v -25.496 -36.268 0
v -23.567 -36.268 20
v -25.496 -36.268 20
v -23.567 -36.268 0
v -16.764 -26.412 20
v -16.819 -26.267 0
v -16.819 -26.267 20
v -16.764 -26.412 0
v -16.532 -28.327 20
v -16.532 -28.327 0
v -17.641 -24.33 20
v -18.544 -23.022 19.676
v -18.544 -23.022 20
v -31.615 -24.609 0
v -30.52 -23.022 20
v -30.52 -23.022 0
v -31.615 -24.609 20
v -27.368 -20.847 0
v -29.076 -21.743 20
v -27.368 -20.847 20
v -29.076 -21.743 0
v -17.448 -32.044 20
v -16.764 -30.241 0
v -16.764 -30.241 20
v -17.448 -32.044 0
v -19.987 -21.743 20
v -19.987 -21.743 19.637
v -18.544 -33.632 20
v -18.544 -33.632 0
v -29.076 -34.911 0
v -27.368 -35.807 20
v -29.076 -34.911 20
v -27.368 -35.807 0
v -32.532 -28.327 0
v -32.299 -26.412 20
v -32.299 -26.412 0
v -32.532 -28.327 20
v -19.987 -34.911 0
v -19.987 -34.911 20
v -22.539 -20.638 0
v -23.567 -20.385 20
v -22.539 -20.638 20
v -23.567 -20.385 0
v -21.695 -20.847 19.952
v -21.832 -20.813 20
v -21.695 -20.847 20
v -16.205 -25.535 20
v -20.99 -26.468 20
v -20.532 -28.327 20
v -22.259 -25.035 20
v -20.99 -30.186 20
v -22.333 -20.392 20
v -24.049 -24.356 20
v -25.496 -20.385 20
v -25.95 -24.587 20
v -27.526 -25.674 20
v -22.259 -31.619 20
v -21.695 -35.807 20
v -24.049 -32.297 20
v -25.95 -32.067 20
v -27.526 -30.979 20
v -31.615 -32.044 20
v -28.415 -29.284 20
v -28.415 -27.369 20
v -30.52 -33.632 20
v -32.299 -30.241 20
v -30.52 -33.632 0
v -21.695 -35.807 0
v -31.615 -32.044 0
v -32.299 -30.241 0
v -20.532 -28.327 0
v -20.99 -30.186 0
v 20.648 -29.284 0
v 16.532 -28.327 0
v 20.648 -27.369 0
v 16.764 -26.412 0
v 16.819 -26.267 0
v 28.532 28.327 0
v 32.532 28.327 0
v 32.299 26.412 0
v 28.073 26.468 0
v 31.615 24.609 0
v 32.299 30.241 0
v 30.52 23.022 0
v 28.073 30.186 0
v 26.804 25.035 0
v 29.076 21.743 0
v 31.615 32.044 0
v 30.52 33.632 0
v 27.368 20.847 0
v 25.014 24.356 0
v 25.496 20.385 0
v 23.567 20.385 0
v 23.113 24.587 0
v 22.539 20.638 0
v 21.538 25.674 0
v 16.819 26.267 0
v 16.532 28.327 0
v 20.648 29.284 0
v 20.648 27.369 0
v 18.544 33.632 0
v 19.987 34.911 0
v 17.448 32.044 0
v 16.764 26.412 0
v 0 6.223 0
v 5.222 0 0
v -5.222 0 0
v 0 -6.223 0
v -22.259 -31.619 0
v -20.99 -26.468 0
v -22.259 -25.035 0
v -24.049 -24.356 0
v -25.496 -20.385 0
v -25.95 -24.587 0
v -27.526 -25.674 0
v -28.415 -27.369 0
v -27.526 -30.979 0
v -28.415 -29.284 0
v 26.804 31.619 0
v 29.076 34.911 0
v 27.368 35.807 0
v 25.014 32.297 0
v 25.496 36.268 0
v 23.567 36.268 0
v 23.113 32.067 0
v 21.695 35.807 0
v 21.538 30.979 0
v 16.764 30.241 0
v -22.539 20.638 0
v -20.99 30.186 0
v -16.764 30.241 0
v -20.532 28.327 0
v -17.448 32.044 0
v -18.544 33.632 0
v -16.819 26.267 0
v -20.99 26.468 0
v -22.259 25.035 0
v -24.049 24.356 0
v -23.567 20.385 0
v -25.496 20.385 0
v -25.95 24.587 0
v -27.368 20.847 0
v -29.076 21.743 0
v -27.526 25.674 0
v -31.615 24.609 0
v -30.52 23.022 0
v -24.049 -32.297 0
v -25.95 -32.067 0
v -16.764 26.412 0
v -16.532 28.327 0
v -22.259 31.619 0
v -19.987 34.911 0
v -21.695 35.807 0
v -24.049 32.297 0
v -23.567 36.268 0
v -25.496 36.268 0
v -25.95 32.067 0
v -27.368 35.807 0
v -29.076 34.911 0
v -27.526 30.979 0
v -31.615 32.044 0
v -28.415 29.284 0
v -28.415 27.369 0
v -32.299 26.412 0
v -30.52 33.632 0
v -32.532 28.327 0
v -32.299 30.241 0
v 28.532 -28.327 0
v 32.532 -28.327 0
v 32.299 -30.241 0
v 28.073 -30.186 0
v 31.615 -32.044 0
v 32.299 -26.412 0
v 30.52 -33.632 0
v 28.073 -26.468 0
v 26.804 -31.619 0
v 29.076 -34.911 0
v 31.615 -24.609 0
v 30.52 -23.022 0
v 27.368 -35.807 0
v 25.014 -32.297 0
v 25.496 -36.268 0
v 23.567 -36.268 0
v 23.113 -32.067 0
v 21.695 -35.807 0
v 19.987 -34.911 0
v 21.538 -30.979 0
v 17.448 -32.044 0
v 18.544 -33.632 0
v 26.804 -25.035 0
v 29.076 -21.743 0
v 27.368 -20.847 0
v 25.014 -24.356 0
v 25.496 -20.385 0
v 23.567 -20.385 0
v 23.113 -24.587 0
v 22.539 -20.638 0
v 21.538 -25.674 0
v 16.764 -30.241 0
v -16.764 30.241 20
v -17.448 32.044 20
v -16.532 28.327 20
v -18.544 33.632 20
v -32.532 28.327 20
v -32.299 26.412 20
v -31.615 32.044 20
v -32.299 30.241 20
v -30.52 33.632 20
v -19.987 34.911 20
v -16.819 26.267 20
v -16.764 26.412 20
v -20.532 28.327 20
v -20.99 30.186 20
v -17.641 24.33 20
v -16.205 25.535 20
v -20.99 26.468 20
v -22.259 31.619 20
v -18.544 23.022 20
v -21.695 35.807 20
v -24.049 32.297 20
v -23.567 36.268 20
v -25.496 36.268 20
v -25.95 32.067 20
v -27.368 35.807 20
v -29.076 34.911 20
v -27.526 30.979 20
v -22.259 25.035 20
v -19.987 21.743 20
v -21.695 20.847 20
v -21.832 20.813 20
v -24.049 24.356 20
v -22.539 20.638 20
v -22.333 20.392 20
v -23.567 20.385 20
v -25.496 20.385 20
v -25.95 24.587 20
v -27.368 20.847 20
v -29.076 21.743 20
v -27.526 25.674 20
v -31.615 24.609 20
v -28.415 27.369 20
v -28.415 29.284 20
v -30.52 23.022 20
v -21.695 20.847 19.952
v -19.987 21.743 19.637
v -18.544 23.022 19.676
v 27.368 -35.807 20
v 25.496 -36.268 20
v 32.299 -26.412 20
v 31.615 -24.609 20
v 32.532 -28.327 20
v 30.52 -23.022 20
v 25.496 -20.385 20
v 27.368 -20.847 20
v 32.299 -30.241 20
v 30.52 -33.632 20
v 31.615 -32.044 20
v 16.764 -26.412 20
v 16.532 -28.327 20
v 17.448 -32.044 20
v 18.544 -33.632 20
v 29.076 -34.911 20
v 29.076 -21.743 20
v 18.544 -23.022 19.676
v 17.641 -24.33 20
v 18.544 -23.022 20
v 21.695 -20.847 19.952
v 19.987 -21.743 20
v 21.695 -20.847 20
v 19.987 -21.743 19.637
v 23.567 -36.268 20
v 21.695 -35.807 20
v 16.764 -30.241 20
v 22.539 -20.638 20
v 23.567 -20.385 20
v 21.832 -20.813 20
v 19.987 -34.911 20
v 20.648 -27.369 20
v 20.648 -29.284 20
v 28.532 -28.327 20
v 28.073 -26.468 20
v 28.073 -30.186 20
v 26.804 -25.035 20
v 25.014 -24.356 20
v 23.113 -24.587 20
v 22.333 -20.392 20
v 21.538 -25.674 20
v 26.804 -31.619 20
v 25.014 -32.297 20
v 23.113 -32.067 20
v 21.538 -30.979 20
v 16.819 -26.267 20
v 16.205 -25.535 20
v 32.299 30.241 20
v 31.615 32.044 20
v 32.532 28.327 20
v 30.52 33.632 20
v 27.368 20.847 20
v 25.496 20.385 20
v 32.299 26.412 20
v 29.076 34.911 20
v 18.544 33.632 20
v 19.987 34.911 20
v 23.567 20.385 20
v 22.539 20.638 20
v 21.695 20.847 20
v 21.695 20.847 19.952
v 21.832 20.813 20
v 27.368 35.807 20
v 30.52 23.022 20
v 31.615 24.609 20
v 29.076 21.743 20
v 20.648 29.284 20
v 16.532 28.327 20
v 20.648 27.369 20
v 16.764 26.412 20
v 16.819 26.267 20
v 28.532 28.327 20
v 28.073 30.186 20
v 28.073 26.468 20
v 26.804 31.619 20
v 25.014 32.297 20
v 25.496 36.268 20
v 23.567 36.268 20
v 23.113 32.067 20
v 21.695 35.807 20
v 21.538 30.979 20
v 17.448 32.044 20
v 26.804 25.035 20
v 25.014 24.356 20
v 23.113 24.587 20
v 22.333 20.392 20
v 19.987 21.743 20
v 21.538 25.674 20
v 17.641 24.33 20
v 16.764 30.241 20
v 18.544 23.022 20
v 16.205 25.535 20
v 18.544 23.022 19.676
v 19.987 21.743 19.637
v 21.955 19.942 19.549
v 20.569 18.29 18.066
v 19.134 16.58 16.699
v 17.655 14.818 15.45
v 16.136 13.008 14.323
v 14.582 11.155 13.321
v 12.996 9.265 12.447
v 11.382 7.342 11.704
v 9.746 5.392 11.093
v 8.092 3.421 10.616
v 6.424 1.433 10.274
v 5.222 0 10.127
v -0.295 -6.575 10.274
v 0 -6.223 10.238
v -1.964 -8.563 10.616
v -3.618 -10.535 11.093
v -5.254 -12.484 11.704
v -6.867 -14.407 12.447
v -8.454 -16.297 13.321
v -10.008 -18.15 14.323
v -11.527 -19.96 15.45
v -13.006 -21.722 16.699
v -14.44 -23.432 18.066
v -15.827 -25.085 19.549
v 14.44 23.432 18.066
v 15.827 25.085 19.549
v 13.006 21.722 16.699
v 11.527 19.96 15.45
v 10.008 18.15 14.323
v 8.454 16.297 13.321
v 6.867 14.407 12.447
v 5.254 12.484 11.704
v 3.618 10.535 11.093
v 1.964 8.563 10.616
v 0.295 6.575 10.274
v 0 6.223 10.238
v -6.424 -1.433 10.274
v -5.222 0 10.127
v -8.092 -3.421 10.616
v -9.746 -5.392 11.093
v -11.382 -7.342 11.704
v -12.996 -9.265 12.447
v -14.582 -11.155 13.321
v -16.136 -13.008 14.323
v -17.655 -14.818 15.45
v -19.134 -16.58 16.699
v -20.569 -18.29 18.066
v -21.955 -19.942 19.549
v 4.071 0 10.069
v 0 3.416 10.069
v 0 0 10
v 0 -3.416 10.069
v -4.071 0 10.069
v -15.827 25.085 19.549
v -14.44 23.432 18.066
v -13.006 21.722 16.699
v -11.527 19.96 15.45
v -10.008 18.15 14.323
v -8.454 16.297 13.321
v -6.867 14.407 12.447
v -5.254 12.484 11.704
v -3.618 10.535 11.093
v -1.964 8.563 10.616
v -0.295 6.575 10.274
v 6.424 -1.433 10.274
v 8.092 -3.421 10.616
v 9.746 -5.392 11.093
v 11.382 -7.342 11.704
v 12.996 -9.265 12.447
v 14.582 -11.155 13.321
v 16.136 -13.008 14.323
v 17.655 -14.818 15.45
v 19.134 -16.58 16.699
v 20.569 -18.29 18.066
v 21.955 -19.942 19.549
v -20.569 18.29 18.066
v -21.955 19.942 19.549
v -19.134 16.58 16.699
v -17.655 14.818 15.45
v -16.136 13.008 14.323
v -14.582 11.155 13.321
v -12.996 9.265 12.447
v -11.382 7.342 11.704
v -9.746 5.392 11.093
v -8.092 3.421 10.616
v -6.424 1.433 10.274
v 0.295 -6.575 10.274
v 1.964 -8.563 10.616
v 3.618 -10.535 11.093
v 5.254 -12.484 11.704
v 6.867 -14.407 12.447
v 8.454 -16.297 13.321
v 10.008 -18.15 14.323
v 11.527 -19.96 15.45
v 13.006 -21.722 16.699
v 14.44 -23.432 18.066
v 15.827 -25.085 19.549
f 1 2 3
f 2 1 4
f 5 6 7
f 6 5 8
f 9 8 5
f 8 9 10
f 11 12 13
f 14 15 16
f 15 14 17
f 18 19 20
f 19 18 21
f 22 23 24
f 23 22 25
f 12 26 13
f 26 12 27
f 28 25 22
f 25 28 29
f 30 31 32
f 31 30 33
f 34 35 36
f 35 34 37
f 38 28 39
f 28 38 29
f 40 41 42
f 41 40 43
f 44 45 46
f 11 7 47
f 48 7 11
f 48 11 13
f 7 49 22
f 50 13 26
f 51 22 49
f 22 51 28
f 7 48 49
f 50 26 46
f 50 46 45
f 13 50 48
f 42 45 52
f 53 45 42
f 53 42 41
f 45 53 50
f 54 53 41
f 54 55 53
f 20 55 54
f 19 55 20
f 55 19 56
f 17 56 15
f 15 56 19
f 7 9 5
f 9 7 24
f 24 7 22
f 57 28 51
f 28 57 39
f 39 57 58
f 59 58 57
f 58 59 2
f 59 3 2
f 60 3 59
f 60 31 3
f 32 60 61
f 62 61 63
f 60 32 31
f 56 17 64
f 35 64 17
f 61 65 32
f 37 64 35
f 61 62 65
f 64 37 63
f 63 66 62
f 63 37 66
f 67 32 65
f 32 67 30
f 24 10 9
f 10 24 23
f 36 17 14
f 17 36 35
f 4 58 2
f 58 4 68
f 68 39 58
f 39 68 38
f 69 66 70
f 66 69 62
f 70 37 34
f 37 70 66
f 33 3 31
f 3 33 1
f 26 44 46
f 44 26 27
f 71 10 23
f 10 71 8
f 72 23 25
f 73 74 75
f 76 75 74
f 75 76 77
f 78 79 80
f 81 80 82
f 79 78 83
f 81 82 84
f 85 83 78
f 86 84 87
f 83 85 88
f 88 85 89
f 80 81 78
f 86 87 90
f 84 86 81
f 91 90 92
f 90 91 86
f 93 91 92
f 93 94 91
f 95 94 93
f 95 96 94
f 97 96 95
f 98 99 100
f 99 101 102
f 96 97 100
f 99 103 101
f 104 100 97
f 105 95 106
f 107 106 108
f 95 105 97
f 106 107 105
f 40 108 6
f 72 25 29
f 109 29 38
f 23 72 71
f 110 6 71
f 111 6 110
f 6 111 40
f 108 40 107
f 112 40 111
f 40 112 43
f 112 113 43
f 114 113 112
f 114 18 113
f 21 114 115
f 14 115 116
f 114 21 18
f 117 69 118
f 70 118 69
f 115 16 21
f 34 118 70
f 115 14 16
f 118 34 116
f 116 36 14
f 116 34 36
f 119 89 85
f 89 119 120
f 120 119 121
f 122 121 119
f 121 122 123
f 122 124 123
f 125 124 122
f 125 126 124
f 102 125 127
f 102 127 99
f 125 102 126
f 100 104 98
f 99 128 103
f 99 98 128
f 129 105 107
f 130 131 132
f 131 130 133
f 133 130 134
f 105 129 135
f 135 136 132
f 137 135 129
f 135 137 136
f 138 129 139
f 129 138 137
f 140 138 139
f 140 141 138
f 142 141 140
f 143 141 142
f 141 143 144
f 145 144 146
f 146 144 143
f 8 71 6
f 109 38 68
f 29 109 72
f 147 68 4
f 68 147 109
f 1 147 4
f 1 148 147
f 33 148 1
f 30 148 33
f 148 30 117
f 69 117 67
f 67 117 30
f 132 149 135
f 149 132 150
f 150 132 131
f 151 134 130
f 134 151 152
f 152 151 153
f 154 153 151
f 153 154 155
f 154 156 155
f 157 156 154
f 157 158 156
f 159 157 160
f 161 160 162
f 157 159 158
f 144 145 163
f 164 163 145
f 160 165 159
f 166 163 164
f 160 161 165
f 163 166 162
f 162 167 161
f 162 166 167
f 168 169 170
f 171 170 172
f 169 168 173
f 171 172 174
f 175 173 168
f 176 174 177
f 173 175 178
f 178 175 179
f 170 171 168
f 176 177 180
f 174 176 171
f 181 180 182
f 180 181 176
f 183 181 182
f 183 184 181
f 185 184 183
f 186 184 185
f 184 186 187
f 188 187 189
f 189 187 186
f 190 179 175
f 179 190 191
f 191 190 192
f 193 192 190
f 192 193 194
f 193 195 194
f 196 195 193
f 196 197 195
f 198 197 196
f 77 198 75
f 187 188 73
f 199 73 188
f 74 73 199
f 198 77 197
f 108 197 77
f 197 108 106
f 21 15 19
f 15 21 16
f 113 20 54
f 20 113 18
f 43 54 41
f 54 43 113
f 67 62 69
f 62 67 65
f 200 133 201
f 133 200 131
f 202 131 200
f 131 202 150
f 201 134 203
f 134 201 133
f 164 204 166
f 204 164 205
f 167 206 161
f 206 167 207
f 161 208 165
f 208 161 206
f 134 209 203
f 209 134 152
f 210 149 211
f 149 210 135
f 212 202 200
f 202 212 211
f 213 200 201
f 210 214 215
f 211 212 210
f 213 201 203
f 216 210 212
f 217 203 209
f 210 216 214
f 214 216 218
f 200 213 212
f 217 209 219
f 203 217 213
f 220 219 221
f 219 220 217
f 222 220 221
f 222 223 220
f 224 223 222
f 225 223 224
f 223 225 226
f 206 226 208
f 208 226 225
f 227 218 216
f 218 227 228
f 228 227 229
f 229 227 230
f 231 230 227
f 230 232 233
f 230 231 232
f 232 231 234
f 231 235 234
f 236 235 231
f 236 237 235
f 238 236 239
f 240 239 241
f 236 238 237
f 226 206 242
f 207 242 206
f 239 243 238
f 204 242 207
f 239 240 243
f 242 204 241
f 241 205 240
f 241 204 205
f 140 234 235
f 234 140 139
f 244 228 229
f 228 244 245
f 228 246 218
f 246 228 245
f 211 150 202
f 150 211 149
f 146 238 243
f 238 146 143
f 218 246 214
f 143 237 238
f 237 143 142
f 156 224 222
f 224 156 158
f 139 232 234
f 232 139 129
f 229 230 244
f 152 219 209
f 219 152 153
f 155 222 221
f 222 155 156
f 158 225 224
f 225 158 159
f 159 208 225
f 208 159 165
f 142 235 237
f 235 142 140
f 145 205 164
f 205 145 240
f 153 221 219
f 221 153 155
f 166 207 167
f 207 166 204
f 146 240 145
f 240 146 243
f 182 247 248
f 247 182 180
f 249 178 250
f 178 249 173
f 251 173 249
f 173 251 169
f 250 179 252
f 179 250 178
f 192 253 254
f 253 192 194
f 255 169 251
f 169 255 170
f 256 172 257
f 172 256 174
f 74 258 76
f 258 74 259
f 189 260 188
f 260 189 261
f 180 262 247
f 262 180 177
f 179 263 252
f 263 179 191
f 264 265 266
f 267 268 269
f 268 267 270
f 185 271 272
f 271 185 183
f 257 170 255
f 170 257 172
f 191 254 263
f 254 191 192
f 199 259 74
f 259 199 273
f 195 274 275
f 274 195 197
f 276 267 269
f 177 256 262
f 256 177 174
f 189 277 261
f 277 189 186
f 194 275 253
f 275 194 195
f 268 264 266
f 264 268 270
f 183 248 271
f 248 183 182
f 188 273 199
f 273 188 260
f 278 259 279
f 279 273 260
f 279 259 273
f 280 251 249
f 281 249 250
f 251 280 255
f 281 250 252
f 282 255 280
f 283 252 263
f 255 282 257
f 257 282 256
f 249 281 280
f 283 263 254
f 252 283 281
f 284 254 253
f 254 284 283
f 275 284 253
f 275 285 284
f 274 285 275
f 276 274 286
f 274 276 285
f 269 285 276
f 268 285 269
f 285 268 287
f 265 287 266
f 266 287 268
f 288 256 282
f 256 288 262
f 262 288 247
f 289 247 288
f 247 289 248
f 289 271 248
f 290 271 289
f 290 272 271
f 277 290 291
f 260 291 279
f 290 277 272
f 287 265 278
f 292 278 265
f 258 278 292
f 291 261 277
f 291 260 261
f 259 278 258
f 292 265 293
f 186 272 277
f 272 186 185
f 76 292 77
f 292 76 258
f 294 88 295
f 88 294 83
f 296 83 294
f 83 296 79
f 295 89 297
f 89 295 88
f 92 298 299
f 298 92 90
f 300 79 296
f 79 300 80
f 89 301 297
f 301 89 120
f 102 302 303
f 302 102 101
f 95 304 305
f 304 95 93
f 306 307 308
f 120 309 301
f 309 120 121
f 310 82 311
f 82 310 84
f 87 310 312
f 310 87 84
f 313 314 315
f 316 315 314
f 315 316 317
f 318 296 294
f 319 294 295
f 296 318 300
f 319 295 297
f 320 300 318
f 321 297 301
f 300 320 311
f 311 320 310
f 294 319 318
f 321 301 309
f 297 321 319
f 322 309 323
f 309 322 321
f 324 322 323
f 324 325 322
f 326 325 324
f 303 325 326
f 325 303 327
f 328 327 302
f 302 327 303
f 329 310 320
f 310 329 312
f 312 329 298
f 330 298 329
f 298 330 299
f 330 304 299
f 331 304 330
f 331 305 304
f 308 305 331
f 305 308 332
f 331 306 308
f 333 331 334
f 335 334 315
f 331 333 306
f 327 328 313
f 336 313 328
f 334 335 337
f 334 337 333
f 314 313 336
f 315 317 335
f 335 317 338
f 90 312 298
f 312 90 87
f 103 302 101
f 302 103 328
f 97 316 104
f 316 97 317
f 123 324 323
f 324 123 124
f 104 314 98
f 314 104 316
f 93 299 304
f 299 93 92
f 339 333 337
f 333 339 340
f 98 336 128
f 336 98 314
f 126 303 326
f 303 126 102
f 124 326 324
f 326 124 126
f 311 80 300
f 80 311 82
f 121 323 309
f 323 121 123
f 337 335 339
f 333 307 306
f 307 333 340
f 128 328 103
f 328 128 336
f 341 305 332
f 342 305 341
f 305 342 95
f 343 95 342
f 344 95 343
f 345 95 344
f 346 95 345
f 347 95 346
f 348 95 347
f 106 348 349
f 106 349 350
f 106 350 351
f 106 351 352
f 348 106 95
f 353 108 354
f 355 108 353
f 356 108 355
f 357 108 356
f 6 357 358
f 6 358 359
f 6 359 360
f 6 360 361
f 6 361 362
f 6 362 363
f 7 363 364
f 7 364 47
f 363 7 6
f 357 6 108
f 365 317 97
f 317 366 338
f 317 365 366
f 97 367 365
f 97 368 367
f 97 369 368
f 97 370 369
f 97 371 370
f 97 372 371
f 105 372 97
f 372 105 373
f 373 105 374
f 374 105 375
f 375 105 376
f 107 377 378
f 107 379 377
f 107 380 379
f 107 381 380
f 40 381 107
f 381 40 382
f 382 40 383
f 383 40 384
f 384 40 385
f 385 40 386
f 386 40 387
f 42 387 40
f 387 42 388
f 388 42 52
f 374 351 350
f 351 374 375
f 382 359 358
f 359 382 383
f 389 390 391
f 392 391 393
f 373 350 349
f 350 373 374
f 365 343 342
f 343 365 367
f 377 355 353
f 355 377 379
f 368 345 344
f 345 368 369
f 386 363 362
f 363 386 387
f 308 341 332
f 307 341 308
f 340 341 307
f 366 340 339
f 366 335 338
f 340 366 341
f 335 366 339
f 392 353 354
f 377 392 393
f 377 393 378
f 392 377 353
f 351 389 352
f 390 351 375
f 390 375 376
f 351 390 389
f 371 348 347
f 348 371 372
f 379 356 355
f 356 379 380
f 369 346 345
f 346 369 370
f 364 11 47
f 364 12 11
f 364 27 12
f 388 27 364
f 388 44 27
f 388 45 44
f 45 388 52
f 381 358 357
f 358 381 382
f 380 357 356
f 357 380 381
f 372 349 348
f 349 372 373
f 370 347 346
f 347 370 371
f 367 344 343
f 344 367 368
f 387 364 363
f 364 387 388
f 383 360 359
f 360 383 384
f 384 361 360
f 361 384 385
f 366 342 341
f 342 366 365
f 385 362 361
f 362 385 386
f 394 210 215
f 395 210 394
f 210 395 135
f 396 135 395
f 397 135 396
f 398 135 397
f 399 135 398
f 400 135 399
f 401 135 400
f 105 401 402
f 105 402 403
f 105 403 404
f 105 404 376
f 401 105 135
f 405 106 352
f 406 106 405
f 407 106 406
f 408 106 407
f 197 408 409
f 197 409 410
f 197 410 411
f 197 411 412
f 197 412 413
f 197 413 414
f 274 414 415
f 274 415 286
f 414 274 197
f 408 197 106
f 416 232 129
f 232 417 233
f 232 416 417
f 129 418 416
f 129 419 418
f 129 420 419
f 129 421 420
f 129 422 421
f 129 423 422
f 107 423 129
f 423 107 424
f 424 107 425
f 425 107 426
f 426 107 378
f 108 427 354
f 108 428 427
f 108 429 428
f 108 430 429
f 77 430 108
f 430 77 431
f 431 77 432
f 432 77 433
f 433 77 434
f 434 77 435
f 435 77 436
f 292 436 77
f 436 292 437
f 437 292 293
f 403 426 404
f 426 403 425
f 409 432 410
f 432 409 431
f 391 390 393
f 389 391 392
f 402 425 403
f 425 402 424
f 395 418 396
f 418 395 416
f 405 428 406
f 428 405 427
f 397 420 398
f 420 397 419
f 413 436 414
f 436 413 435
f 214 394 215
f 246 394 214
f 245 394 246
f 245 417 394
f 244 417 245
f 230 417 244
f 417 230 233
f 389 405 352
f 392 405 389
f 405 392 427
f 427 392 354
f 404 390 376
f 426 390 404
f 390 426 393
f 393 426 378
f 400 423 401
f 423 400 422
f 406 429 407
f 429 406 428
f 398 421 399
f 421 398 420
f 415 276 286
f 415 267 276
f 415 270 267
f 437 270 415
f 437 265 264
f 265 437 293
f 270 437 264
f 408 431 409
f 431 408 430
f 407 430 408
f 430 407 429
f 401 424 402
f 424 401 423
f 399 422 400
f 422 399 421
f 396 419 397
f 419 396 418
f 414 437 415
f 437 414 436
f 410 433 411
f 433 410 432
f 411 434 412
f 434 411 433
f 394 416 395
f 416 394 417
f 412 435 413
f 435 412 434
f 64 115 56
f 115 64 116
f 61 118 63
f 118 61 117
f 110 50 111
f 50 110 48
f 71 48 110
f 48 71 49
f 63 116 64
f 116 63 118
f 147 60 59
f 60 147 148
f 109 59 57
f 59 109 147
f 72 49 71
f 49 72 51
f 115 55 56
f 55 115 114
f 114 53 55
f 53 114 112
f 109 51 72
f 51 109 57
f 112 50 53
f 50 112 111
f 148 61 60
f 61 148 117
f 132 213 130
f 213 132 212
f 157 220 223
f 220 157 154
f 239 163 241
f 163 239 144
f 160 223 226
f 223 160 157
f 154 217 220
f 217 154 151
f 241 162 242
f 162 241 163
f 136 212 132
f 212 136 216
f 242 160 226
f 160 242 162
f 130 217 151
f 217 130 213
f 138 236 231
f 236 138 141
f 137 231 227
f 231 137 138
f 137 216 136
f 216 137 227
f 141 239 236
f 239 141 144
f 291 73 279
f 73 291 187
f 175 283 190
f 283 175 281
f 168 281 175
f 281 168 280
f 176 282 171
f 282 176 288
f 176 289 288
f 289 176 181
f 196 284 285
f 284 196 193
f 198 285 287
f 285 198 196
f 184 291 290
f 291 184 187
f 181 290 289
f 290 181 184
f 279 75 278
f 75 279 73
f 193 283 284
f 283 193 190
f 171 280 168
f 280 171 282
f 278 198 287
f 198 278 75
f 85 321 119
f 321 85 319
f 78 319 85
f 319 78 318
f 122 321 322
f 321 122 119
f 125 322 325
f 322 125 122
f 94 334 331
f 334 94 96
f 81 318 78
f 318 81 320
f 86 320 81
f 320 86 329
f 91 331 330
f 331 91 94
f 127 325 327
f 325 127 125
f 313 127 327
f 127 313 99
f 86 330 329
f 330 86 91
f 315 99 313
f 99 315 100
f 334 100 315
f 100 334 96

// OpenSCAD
thickness = 20;

wheel_diameter = 27.85;
wheelx = (sqrt(2)*15 + wheel_diameter) / 2;
wheely = wheelx / cos(30);

translate([0, 0, thickness / 2 + 14])
rotate([90, 0, 0]) rotate([0, 0, 45])
% cube([15, 15, 200], center=true);

translate([0, 0, thickness/2])
difference() {
  union() {
    for (x = [-wheelx, wheelx]) {
      for (y = [-wheely, wheely]) {
        translate([x, y, 0]) {
          cylinder(r=8, h=thickness, center=true);
          translate([0, 0, 14]) % difference() {
            cylinder(r=11, h=7, center=true);
            cylinder(r=4, h=7.1, center=true);
          }
        }
      }
    }
    for (a = [-40, 40]) rotate([0, 0, a]) difference() {
      cube([8, 80, thickness], center=true);
      translate([0, 0, 50]) rotate([0, 90, 0])
        cylinder(r=50, h=8.1, center=true, $fn=120);
    }
  }
  for (x = [-wheelx, wheelx]) {
    for (y = [-wheely, wheely]) {
      translate([x, y, 0]) {
        cylinder(r=4, h=thickness+1, center=true);
      }
    }
  }
}
